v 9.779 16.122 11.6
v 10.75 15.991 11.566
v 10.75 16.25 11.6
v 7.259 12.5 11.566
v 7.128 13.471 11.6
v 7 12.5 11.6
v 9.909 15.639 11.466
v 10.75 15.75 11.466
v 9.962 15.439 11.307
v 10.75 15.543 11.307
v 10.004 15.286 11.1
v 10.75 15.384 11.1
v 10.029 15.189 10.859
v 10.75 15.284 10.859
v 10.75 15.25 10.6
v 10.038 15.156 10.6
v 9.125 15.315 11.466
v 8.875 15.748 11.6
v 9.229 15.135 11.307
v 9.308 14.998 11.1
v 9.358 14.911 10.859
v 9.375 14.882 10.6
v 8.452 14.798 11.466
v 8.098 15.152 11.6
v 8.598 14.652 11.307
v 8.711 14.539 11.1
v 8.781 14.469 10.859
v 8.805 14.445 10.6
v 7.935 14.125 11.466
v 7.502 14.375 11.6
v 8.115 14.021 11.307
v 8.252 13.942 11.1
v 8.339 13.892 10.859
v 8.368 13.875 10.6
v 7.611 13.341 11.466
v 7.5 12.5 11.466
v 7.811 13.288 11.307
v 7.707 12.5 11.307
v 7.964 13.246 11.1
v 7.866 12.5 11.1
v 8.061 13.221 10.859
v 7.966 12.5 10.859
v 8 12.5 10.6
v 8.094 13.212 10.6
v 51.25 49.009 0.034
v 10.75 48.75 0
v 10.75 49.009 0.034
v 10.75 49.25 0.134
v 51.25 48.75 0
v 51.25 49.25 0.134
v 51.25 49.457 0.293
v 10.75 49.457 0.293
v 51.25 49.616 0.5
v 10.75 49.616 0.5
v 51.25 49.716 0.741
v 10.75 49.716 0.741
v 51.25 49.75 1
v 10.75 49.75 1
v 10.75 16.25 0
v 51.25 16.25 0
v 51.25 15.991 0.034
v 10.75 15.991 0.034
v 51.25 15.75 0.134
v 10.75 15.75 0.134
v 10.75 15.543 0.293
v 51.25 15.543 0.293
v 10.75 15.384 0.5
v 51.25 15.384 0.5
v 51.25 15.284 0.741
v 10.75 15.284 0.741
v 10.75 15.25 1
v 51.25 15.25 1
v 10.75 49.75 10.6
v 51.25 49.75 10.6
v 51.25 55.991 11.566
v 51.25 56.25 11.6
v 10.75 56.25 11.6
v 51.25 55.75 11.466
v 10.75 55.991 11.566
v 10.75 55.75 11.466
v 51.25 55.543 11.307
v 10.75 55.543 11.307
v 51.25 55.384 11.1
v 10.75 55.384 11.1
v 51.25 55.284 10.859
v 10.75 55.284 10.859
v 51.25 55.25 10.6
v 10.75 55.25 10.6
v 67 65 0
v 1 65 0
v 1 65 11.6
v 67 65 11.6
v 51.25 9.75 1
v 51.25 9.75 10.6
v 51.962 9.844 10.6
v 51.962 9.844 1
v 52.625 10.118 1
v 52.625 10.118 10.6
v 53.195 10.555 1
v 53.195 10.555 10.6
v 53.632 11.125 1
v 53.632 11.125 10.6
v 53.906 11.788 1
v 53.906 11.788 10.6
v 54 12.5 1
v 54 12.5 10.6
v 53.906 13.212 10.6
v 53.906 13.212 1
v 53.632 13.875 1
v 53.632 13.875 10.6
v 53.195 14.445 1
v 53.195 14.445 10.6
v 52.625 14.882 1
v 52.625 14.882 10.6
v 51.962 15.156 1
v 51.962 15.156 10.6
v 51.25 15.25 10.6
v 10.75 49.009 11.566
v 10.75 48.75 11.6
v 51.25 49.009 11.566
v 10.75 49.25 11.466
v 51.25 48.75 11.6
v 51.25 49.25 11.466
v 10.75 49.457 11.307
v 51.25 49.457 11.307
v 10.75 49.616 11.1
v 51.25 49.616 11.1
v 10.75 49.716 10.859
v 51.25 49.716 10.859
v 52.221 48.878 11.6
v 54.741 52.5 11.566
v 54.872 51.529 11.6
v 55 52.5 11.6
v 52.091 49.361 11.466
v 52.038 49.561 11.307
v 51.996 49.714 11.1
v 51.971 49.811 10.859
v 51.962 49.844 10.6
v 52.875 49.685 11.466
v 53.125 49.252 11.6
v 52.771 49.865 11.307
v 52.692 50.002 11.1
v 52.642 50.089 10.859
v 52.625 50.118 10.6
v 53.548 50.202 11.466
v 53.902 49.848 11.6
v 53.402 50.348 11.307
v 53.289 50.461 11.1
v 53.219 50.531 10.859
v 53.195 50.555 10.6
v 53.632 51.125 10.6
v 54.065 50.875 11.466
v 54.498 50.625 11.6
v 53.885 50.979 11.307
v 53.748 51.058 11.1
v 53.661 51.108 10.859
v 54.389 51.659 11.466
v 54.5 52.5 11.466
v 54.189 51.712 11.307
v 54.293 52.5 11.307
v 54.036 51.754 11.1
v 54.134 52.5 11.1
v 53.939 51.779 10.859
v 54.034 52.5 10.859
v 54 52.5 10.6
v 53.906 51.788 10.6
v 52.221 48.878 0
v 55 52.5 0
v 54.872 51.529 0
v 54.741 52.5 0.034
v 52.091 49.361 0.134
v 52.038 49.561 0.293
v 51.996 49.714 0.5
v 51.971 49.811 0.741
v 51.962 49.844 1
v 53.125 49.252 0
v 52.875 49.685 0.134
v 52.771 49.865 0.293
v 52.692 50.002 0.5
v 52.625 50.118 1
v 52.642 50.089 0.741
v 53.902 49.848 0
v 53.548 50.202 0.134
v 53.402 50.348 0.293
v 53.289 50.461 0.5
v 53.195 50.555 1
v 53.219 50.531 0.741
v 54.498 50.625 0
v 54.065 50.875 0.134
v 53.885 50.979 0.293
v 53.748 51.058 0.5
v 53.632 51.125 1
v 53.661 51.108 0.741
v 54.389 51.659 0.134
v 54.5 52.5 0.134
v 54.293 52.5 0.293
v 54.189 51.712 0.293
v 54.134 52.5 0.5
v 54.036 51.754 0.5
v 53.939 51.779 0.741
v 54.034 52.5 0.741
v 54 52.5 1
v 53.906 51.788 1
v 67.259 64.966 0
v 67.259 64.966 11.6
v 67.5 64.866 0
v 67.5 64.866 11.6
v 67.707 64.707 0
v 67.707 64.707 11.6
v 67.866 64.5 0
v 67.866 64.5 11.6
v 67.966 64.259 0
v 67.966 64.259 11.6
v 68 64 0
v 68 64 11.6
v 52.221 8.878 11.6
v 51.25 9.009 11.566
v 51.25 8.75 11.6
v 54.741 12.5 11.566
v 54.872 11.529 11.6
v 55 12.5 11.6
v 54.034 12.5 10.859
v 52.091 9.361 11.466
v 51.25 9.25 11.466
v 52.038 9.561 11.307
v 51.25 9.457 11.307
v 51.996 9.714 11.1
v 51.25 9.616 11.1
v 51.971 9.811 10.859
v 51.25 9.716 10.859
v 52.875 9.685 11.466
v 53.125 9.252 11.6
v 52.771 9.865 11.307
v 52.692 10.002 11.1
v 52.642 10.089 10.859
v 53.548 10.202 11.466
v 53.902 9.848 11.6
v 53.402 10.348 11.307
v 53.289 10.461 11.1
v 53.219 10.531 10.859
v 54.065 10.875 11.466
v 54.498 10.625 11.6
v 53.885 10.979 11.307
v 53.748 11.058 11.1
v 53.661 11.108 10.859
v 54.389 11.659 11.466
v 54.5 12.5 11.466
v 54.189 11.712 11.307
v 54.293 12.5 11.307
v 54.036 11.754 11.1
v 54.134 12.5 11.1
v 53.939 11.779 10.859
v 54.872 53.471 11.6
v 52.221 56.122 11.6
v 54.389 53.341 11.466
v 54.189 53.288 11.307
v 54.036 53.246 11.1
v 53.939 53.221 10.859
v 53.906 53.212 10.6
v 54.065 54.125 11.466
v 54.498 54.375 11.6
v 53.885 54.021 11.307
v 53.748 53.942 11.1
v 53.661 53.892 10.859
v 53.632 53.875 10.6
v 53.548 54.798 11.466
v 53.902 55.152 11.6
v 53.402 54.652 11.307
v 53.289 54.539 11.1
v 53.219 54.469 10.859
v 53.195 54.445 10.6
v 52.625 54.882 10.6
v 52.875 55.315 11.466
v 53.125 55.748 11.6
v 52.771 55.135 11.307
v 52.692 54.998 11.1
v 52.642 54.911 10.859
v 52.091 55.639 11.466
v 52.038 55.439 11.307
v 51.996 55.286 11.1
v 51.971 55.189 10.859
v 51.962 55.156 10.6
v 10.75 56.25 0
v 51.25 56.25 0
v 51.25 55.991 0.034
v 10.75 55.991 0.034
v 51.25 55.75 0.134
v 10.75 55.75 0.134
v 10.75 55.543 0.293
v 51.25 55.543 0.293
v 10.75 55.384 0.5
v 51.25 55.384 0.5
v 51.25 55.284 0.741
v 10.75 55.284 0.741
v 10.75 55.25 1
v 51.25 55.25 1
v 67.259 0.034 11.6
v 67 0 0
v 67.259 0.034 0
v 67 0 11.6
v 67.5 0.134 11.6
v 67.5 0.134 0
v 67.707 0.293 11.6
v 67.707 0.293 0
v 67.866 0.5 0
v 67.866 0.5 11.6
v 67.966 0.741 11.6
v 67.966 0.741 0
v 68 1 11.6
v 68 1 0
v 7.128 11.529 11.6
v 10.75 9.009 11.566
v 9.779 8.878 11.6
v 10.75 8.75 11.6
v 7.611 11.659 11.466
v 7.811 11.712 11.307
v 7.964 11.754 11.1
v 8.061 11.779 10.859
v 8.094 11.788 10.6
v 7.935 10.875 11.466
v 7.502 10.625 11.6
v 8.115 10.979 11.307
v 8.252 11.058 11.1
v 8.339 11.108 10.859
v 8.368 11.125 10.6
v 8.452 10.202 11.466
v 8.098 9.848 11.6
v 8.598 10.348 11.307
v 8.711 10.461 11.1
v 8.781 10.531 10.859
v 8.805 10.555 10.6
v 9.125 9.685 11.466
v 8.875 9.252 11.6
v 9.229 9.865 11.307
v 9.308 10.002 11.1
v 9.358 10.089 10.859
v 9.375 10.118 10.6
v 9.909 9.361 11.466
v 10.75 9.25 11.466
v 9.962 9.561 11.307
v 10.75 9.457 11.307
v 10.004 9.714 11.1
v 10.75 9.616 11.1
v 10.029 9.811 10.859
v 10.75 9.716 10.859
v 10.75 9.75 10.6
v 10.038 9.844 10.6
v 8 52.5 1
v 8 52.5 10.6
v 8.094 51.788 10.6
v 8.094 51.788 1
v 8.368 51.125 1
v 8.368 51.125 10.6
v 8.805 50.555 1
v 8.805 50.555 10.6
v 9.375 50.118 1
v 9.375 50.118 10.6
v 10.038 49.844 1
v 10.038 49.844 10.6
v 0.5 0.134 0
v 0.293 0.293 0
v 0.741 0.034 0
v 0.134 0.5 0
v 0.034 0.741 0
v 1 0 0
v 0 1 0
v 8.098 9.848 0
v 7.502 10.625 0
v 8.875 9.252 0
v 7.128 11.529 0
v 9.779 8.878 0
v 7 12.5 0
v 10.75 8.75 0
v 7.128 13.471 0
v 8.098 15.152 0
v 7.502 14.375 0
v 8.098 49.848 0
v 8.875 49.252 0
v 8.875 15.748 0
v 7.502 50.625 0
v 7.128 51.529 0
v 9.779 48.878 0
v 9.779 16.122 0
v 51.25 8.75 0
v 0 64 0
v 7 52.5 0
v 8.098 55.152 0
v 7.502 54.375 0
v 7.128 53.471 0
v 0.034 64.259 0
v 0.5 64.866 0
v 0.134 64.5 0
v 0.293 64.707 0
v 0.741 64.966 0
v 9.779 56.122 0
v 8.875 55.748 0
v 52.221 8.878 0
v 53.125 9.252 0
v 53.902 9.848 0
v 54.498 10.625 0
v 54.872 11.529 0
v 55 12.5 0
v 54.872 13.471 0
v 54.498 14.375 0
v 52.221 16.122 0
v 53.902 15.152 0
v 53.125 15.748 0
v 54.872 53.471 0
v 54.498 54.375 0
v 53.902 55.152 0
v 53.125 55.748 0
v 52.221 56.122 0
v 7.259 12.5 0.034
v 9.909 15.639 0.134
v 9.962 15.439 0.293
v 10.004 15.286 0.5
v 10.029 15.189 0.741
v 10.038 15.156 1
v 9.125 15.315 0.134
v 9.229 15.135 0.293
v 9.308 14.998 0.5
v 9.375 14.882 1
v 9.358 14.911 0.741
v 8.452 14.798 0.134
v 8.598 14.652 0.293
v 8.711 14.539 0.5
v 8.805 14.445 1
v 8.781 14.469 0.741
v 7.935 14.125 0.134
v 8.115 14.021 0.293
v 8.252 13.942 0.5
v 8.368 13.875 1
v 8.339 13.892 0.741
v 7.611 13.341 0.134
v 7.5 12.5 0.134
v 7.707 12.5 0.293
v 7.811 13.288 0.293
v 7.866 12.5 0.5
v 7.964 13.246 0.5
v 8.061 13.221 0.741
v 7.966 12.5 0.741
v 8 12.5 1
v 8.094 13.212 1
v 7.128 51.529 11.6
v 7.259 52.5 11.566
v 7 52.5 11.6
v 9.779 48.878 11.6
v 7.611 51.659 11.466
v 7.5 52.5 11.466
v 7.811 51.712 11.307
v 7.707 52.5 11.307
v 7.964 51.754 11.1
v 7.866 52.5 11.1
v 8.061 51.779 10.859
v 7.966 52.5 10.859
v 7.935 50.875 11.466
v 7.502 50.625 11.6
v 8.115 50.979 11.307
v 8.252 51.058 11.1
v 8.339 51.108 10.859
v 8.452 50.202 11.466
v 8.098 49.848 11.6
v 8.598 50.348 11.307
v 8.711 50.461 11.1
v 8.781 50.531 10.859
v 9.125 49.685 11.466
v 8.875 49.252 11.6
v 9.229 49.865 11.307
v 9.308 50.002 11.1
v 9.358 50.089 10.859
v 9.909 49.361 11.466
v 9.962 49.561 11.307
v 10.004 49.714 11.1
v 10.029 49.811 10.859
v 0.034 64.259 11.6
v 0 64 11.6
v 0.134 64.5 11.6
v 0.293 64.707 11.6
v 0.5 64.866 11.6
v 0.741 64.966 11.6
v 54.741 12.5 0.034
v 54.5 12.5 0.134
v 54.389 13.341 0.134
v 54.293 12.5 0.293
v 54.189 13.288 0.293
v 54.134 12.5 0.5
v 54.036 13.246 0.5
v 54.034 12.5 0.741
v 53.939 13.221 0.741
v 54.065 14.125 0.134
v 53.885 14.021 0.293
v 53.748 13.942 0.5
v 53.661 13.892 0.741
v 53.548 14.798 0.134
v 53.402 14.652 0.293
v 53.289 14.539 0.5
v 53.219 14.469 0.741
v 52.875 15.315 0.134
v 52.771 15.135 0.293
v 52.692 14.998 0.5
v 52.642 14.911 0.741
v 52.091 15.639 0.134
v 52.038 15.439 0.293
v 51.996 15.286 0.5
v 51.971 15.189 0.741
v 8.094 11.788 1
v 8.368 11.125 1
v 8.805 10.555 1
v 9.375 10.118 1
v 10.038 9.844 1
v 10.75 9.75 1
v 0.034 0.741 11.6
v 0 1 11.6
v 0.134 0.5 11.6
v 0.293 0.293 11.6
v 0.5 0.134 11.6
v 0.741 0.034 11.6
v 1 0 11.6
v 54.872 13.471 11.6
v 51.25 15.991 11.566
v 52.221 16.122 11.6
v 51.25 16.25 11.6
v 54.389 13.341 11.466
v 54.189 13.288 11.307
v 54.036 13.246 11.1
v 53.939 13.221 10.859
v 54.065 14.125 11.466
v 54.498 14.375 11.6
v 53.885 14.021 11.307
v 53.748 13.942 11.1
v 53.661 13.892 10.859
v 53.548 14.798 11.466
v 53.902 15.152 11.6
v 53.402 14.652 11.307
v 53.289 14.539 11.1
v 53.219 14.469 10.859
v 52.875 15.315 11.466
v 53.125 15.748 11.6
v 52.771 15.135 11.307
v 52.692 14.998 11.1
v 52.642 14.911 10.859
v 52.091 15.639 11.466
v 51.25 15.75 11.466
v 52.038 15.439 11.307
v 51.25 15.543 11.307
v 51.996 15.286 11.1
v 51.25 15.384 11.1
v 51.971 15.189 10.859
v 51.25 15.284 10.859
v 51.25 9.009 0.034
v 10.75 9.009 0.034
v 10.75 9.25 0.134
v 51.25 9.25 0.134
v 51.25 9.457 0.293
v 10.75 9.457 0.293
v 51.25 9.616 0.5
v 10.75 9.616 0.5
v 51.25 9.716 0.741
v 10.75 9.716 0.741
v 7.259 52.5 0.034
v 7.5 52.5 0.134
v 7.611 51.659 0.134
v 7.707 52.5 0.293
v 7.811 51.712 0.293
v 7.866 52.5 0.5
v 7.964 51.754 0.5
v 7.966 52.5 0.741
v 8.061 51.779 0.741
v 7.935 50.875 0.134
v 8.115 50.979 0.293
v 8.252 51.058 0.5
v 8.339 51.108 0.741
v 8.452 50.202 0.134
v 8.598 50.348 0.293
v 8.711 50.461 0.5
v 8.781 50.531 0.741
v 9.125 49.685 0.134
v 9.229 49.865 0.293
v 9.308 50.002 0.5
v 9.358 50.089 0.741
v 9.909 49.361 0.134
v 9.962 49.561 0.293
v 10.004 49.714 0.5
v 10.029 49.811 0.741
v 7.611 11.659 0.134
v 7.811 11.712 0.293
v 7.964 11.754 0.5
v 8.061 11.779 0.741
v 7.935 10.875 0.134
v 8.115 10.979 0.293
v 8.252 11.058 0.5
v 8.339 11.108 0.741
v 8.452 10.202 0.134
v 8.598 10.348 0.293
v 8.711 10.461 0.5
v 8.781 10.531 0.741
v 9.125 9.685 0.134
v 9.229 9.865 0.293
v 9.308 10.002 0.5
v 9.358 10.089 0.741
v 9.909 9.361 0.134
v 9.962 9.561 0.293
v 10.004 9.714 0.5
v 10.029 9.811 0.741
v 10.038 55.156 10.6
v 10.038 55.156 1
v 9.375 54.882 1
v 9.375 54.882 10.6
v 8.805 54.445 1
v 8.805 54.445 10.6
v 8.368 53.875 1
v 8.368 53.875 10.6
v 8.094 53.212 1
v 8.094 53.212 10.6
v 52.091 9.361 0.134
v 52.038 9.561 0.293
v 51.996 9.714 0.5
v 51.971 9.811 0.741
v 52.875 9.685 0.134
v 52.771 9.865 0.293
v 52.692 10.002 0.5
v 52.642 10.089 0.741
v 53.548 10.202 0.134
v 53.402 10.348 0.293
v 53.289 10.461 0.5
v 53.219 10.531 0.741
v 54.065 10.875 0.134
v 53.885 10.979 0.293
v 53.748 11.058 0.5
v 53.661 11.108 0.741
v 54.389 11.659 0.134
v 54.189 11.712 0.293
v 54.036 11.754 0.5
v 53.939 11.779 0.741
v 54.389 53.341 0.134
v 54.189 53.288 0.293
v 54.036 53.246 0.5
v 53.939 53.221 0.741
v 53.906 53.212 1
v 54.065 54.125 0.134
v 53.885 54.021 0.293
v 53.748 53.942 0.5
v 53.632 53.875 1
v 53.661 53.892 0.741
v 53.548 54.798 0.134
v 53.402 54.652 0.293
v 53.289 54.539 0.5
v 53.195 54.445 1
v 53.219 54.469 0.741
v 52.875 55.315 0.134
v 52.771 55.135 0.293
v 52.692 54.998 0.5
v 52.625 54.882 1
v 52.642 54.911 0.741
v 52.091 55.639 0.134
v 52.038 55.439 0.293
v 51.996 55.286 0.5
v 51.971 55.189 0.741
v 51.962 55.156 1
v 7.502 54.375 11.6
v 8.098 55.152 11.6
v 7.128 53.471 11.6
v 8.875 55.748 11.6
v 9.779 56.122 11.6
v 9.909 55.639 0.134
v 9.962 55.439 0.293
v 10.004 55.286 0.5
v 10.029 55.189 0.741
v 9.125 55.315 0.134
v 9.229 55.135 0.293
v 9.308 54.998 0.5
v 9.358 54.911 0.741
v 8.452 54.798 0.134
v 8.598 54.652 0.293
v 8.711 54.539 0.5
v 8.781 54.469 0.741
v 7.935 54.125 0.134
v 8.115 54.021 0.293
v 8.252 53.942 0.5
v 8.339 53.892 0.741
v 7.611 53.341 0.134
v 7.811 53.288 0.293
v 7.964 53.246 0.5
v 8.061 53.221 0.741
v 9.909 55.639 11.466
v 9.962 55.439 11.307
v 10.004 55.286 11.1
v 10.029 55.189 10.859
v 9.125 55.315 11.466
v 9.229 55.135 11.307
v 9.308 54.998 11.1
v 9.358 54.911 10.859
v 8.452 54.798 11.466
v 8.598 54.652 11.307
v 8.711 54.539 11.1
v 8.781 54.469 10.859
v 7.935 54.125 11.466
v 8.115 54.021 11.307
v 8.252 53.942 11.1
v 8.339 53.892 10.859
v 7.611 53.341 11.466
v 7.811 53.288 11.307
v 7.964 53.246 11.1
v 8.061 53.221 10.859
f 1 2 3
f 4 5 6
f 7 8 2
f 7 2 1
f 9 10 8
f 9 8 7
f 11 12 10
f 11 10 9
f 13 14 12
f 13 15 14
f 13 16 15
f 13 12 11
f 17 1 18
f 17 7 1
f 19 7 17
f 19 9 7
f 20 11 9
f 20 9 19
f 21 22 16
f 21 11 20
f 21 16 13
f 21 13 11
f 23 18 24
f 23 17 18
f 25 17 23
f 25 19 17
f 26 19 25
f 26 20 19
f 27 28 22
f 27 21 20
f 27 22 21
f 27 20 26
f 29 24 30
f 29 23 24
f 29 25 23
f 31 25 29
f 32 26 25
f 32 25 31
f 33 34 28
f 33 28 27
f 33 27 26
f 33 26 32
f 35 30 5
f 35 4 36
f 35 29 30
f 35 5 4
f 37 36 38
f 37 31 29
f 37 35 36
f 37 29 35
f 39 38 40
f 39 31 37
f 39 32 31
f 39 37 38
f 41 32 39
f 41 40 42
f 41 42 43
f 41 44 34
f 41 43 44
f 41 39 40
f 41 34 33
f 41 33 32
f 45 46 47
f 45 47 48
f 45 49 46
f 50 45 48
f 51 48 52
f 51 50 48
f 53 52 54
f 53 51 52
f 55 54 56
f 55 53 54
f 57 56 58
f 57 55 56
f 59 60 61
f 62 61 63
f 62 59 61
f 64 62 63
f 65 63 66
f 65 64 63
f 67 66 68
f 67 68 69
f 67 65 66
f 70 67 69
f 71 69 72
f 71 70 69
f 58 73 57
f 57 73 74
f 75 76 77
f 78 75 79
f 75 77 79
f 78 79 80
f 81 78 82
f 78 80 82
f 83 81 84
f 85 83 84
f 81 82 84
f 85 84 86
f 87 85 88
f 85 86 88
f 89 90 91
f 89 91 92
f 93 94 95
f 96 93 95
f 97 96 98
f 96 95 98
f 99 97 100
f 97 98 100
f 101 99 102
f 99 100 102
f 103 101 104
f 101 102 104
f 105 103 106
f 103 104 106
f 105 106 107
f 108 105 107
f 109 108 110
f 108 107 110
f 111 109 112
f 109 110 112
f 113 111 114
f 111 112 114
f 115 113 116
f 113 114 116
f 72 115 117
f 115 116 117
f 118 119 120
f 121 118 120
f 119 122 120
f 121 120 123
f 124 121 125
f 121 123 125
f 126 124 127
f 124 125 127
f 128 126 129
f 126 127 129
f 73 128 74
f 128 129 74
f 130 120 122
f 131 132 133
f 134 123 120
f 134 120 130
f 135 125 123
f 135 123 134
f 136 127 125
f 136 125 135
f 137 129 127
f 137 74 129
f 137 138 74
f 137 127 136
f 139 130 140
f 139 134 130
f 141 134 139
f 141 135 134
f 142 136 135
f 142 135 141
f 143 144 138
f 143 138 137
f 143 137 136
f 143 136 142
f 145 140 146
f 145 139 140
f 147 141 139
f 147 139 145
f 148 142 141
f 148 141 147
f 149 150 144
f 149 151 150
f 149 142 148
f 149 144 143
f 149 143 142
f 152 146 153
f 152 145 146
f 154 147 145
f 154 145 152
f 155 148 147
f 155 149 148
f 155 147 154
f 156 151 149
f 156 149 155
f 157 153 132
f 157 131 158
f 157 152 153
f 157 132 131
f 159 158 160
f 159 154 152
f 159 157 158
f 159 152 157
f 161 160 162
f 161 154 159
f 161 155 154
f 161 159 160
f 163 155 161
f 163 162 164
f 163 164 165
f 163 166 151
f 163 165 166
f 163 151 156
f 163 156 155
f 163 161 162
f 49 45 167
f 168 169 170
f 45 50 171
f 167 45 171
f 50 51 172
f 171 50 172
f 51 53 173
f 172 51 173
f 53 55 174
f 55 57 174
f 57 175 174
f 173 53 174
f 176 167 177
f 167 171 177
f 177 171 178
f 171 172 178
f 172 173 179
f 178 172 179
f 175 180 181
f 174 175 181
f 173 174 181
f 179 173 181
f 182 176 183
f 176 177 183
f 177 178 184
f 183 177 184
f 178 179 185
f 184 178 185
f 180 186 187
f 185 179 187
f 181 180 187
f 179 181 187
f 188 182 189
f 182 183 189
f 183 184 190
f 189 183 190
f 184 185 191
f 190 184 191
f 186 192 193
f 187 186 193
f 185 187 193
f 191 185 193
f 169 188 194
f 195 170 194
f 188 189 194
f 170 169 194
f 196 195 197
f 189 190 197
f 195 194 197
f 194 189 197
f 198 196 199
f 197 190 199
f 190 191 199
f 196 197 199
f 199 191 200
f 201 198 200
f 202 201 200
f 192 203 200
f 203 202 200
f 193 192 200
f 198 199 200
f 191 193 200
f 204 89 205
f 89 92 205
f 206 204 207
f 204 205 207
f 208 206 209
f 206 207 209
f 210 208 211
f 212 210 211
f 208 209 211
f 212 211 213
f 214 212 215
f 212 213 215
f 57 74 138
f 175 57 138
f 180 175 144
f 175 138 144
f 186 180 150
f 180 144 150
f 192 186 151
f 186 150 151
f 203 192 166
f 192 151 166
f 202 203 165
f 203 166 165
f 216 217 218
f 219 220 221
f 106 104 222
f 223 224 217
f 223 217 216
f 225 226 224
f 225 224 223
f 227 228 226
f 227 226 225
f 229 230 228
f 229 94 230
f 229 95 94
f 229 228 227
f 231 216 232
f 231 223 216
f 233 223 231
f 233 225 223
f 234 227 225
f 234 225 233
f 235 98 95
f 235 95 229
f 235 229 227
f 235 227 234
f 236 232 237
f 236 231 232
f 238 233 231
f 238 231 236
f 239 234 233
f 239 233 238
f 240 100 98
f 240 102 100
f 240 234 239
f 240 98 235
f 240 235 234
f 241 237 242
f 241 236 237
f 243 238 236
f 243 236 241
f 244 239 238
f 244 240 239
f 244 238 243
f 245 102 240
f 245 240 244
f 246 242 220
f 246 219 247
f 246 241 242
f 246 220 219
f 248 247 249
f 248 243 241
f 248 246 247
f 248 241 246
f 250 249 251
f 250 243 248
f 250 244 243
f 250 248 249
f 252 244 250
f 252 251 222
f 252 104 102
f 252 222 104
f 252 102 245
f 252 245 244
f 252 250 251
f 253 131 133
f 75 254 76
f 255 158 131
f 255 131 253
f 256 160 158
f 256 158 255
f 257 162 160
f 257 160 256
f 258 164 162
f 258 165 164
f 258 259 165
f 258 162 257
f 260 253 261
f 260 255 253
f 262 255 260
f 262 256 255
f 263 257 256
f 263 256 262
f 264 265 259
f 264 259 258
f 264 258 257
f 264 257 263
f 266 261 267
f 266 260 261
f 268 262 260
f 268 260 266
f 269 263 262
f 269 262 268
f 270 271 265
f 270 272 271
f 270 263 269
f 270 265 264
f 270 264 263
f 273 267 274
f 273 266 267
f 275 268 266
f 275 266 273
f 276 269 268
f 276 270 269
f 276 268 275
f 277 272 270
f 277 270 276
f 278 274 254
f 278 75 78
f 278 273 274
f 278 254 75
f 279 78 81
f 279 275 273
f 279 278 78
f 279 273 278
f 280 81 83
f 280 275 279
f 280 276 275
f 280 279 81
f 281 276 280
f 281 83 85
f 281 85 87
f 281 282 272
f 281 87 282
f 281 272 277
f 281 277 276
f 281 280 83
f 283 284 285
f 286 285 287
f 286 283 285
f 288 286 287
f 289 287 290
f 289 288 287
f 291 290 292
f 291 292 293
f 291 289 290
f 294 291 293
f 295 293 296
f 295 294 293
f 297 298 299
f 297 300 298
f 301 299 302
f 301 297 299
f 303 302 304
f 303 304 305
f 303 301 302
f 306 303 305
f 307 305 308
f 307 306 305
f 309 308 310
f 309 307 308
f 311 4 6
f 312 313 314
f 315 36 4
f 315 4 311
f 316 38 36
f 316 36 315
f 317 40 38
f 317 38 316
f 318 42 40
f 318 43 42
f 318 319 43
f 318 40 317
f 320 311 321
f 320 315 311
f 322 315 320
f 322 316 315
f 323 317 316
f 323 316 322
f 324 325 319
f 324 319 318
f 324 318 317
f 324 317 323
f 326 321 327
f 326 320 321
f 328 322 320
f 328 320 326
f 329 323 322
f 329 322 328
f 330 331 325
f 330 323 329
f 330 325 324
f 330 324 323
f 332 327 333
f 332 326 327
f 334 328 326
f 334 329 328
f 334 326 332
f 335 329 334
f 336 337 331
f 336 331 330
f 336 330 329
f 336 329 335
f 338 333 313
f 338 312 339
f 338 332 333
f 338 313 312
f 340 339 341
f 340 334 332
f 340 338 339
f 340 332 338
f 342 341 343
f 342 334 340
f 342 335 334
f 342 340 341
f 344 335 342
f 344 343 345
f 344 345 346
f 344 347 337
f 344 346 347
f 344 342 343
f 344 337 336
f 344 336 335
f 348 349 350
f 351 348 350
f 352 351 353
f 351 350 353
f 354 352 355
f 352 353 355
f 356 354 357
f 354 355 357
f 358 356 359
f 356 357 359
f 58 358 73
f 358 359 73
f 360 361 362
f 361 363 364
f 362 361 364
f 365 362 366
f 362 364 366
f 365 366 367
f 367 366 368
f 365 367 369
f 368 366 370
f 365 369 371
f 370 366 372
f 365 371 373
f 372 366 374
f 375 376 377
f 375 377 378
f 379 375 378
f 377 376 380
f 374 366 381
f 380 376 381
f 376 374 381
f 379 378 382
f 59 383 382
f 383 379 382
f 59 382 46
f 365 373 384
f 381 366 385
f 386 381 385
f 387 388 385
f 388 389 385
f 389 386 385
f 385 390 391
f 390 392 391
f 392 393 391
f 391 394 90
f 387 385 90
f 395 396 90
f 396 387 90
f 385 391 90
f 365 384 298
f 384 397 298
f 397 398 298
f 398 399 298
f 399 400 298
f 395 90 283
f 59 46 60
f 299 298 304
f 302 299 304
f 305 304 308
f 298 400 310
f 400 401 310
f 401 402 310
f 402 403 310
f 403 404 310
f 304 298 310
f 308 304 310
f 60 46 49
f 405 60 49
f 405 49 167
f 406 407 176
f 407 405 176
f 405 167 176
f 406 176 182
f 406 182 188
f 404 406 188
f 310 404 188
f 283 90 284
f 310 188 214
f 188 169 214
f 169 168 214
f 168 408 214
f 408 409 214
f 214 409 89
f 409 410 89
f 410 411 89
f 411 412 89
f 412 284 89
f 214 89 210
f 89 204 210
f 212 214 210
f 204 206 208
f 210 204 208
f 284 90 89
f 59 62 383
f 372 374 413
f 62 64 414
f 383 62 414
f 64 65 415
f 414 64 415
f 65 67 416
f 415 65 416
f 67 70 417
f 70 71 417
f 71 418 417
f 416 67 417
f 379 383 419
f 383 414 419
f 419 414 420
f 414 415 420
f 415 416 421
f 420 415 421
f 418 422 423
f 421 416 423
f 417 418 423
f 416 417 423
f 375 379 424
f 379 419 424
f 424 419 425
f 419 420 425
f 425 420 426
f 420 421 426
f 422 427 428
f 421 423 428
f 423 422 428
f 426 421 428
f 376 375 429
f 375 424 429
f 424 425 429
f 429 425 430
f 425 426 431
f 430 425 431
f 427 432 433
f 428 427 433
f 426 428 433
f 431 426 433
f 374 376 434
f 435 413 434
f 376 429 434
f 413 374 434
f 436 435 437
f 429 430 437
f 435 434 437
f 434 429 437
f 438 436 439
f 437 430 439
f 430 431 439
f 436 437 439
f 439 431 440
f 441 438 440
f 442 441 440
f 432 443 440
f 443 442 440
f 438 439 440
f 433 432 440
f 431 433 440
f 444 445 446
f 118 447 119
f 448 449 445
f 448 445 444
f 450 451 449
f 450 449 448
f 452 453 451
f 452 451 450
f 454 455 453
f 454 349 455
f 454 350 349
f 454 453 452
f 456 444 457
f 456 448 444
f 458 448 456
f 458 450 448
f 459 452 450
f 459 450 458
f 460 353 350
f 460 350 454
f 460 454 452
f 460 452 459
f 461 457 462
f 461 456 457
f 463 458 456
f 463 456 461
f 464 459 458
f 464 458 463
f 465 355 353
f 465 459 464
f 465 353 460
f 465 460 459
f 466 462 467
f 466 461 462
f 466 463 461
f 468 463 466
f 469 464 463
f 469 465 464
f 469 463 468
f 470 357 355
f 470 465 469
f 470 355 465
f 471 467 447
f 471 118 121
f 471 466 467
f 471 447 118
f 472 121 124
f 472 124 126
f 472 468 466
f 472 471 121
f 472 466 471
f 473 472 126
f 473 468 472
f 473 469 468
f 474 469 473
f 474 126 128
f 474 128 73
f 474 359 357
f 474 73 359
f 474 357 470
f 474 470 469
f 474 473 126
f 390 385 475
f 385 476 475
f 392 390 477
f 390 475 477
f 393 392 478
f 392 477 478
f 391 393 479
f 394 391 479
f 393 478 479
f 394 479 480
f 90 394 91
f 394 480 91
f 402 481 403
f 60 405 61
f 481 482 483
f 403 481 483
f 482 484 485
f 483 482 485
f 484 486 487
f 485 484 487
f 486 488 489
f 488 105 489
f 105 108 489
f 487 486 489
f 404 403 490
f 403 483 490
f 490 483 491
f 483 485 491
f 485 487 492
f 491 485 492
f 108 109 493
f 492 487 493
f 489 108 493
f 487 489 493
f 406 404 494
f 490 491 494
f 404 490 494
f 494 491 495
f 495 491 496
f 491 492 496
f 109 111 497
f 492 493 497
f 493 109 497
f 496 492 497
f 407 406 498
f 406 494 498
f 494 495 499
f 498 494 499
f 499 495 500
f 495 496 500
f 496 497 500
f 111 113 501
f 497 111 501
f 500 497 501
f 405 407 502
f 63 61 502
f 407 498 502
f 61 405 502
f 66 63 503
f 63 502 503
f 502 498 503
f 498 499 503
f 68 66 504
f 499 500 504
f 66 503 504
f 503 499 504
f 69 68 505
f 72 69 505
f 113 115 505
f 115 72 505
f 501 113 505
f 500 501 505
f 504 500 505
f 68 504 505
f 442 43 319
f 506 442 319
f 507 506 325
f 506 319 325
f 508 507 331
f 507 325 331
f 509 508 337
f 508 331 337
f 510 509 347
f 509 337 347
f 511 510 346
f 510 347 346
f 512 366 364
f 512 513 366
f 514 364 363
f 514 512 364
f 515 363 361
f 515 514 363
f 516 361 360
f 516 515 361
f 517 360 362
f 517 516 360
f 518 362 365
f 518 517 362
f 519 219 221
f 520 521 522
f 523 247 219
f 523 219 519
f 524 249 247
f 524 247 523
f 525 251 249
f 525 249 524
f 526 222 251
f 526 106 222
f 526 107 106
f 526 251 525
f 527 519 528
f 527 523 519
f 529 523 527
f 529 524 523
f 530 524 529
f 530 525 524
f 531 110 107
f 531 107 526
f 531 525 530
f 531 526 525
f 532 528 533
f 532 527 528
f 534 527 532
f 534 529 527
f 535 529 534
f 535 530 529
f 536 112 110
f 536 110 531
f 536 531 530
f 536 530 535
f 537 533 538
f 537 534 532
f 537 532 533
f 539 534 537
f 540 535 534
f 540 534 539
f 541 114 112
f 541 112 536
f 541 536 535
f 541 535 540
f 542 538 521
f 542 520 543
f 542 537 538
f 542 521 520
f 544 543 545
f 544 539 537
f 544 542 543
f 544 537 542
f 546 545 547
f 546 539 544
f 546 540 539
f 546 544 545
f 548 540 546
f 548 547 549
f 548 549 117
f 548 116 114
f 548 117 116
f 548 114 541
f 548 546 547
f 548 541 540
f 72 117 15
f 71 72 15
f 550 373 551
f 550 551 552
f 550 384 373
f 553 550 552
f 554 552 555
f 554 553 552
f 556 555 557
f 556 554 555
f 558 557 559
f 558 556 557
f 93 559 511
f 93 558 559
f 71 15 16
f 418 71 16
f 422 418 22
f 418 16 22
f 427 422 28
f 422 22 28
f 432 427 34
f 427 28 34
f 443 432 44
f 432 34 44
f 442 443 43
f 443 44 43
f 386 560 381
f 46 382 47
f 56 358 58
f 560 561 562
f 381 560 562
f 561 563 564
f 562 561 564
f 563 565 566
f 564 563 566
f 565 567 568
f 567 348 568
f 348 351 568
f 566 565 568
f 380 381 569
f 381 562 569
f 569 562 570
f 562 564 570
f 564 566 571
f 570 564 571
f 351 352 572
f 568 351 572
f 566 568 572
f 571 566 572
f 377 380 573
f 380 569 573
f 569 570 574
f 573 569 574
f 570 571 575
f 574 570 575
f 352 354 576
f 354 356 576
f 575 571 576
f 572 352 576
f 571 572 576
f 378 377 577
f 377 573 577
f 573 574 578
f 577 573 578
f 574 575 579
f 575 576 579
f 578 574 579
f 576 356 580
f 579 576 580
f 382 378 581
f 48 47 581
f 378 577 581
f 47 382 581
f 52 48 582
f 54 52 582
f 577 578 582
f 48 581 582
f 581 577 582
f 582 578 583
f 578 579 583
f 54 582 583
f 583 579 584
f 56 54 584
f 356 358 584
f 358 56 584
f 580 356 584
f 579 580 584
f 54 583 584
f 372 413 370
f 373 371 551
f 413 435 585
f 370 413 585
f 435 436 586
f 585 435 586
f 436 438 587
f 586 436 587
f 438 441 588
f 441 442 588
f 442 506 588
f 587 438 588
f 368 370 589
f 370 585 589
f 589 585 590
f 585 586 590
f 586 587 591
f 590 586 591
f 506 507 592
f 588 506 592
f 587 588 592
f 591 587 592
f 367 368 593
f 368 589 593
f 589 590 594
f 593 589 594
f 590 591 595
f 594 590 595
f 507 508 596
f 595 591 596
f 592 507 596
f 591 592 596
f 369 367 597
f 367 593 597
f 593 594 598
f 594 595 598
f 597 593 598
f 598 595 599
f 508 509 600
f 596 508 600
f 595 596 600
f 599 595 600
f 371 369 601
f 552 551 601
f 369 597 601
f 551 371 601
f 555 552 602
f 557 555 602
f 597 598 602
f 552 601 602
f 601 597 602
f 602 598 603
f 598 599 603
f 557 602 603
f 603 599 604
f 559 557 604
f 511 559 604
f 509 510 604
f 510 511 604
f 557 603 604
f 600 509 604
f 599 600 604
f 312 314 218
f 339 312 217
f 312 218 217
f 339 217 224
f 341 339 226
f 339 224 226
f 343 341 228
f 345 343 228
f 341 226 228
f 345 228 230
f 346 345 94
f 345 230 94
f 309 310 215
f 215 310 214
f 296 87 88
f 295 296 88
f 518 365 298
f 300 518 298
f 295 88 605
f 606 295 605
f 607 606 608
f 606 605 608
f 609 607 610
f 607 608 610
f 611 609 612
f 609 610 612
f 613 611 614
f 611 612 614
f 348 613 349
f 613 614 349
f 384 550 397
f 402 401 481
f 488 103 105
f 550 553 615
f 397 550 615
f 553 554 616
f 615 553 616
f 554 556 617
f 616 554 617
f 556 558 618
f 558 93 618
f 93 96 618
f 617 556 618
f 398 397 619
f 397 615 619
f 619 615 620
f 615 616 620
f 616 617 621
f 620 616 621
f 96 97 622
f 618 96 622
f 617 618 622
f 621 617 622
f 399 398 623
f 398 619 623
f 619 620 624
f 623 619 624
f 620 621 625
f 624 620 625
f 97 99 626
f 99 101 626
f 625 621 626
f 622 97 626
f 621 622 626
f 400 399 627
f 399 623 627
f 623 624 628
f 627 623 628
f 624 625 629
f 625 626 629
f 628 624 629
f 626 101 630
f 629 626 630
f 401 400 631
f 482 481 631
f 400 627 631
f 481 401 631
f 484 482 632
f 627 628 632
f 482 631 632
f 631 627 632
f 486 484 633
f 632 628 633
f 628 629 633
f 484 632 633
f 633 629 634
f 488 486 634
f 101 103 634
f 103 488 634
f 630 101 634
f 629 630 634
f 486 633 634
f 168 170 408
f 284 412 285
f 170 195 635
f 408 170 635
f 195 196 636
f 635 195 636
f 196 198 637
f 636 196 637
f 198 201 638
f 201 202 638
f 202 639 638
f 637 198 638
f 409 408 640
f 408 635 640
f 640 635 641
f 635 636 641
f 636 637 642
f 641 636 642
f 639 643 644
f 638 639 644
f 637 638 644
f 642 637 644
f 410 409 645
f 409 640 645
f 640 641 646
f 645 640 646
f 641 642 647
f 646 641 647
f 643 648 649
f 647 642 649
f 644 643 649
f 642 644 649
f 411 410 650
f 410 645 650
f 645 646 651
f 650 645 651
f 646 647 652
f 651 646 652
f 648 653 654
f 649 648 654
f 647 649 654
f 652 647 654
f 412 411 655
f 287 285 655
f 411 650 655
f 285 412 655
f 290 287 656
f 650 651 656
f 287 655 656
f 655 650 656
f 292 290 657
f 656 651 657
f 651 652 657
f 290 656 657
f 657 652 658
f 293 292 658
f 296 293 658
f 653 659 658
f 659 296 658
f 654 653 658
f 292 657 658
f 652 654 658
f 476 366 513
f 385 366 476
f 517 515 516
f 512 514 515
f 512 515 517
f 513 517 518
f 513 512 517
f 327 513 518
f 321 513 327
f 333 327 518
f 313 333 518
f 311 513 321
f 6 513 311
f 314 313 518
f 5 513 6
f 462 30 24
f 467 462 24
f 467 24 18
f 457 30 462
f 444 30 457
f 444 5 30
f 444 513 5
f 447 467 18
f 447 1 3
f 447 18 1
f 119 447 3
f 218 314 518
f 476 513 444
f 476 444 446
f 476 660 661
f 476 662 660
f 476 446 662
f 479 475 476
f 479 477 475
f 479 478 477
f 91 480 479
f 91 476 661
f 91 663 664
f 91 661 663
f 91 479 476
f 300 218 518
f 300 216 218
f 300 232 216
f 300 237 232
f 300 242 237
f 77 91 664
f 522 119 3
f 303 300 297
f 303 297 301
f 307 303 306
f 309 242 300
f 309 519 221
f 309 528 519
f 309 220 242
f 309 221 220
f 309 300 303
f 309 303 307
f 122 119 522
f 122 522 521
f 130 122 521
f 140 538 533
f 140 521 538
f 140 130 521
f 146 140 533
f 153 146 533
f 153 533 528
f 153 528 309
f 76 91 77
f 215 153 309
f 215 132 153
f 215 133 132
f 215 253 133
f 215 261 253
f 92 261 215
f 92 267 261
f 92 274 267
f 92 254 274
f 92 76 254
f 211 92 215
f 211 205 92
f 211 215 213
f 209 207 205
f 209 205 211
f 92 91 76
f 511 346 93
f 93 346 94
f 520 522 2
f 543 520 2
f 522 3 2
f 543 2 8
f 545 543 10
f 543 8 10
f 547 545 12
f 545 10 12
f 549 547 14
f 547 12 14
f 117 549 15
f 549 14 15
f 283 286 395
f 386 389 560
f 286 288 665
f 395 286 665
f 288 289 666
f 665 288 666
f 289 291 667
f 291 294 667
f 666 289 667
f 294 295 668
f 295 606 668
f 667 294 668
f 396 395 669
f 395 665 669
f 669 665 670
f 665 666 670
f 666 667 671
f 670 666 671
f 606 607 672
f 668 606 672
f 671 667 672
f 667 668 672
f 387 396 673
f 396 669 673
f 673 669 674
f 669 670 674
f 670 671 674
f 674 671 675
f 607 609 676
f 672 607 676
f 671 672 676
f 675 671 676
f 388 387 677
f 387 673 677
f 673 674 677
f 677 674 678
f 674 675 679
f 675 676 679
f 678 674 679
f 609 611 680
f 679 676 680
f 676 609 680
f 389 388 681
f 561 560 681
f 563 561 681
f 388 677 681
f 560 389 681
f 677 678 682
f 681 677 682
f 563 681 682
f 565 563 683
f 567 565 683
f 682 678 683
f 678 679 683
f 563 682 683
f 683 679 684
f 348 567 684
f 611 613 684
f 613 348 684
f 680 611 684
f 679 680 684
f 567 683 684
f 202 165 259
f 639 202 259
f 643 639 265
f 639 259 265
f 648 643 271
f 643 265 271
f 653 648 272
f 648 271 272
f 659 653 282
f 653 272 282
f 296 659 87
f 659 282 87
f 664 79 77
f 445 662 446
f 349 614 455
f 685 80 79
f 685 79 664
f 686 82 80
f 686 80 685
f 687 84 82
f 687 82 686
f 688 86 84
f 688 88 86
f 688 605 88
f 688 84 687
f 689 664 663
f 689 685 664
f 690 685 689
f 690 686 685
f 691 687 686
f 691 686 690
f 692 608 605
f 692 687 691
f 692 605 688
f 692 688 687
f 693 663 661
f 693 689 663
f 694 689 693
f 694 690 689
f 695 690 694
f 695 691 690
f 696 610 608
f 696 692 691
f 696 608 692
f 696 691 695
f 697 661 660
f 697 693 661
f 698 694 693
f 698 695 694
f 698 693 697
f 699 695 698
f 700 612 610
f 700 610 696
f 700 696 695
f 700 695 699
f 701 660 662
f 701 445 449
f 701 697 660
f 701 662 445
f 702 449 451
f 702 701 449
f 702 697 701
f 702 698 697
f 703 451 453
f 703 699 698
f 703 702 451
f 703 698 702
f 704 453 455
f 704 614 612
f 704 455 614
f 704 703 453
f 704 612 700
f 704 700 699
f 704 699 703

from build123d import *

# Parameters (mm, degrees)
F0_W     = 68
F0_H     = 65
F1_DEPTH = 11.6
F3_DEPTH = 25
F4_R     = 1


with BuildPart() as f1:
    # F0 (on Top) → F1 (new body)
    with BuildSketch(Plane.XY):
        with Locations((34, 32.5)):
            Rectangle(F0_W, F0_H)
    extrude(amount=F1_DEPTH)

    # F2 (on face) → F3 (cut)
    with BuildSketch(Plane.XY.offset(11.6)):
        with BuildLine():
            Line((51.25, 15.25), (10.75, 15.25))
            ThreePointArc((10.75, 15.25), (8.805456, 14.444544), (8, 12.5))
            ThreePointArc((8, 12.5), (8.805456, 10.555456), (10.75, 9.75))
            Line((10.75, 9.75), (51.25, 9.75))
            ThreePointArc((51.25, 9.75), (53.194544, 10.555456), (54, 12.5))
            ThreePointArc((54, 12.5), (53.194544, 14.444544), (51.25, 15.25))
        make_face()
        with BuildLine():
            Line((51.25, 55.25), (10.75, 55.25))
            ThreePointArc((10.75, 55.25), (8.805456, 54.444544), (8, 52.5))
            ThreePointArc((8, 52.5), (8.805456, 50.555456), (10.75, 49.75))
            Line((10.75, 49.75), (51.25, 49.75))
            ThreePointArc((51.25, 49.75), (53.194544, 50.555456), (54, 52.5))
            ThreePointArc((54, 52.5), (53.194544, 54.444544), (51.25, 55.25))
        make_face()
    extrude(amount=-F3_DEPTH, mode=Mode.SUBTRACT)

    # F4
    f4_edges = [f1.edges().sort_by_distance(p)[0] for p in [
        (31, 49.75, 0),
        (31, 9.75, 0),
        (31, 49.75, 11.6),
        (31, 15.25, 11.6),
        (68, 0, 5.8),
        (68, 65, 5.8),
        (0, 65, 5.8),
        (0, 0, 5.8),
    ]]
    fillet(f4_edges, radius=F4_R)


solid = f1.part
